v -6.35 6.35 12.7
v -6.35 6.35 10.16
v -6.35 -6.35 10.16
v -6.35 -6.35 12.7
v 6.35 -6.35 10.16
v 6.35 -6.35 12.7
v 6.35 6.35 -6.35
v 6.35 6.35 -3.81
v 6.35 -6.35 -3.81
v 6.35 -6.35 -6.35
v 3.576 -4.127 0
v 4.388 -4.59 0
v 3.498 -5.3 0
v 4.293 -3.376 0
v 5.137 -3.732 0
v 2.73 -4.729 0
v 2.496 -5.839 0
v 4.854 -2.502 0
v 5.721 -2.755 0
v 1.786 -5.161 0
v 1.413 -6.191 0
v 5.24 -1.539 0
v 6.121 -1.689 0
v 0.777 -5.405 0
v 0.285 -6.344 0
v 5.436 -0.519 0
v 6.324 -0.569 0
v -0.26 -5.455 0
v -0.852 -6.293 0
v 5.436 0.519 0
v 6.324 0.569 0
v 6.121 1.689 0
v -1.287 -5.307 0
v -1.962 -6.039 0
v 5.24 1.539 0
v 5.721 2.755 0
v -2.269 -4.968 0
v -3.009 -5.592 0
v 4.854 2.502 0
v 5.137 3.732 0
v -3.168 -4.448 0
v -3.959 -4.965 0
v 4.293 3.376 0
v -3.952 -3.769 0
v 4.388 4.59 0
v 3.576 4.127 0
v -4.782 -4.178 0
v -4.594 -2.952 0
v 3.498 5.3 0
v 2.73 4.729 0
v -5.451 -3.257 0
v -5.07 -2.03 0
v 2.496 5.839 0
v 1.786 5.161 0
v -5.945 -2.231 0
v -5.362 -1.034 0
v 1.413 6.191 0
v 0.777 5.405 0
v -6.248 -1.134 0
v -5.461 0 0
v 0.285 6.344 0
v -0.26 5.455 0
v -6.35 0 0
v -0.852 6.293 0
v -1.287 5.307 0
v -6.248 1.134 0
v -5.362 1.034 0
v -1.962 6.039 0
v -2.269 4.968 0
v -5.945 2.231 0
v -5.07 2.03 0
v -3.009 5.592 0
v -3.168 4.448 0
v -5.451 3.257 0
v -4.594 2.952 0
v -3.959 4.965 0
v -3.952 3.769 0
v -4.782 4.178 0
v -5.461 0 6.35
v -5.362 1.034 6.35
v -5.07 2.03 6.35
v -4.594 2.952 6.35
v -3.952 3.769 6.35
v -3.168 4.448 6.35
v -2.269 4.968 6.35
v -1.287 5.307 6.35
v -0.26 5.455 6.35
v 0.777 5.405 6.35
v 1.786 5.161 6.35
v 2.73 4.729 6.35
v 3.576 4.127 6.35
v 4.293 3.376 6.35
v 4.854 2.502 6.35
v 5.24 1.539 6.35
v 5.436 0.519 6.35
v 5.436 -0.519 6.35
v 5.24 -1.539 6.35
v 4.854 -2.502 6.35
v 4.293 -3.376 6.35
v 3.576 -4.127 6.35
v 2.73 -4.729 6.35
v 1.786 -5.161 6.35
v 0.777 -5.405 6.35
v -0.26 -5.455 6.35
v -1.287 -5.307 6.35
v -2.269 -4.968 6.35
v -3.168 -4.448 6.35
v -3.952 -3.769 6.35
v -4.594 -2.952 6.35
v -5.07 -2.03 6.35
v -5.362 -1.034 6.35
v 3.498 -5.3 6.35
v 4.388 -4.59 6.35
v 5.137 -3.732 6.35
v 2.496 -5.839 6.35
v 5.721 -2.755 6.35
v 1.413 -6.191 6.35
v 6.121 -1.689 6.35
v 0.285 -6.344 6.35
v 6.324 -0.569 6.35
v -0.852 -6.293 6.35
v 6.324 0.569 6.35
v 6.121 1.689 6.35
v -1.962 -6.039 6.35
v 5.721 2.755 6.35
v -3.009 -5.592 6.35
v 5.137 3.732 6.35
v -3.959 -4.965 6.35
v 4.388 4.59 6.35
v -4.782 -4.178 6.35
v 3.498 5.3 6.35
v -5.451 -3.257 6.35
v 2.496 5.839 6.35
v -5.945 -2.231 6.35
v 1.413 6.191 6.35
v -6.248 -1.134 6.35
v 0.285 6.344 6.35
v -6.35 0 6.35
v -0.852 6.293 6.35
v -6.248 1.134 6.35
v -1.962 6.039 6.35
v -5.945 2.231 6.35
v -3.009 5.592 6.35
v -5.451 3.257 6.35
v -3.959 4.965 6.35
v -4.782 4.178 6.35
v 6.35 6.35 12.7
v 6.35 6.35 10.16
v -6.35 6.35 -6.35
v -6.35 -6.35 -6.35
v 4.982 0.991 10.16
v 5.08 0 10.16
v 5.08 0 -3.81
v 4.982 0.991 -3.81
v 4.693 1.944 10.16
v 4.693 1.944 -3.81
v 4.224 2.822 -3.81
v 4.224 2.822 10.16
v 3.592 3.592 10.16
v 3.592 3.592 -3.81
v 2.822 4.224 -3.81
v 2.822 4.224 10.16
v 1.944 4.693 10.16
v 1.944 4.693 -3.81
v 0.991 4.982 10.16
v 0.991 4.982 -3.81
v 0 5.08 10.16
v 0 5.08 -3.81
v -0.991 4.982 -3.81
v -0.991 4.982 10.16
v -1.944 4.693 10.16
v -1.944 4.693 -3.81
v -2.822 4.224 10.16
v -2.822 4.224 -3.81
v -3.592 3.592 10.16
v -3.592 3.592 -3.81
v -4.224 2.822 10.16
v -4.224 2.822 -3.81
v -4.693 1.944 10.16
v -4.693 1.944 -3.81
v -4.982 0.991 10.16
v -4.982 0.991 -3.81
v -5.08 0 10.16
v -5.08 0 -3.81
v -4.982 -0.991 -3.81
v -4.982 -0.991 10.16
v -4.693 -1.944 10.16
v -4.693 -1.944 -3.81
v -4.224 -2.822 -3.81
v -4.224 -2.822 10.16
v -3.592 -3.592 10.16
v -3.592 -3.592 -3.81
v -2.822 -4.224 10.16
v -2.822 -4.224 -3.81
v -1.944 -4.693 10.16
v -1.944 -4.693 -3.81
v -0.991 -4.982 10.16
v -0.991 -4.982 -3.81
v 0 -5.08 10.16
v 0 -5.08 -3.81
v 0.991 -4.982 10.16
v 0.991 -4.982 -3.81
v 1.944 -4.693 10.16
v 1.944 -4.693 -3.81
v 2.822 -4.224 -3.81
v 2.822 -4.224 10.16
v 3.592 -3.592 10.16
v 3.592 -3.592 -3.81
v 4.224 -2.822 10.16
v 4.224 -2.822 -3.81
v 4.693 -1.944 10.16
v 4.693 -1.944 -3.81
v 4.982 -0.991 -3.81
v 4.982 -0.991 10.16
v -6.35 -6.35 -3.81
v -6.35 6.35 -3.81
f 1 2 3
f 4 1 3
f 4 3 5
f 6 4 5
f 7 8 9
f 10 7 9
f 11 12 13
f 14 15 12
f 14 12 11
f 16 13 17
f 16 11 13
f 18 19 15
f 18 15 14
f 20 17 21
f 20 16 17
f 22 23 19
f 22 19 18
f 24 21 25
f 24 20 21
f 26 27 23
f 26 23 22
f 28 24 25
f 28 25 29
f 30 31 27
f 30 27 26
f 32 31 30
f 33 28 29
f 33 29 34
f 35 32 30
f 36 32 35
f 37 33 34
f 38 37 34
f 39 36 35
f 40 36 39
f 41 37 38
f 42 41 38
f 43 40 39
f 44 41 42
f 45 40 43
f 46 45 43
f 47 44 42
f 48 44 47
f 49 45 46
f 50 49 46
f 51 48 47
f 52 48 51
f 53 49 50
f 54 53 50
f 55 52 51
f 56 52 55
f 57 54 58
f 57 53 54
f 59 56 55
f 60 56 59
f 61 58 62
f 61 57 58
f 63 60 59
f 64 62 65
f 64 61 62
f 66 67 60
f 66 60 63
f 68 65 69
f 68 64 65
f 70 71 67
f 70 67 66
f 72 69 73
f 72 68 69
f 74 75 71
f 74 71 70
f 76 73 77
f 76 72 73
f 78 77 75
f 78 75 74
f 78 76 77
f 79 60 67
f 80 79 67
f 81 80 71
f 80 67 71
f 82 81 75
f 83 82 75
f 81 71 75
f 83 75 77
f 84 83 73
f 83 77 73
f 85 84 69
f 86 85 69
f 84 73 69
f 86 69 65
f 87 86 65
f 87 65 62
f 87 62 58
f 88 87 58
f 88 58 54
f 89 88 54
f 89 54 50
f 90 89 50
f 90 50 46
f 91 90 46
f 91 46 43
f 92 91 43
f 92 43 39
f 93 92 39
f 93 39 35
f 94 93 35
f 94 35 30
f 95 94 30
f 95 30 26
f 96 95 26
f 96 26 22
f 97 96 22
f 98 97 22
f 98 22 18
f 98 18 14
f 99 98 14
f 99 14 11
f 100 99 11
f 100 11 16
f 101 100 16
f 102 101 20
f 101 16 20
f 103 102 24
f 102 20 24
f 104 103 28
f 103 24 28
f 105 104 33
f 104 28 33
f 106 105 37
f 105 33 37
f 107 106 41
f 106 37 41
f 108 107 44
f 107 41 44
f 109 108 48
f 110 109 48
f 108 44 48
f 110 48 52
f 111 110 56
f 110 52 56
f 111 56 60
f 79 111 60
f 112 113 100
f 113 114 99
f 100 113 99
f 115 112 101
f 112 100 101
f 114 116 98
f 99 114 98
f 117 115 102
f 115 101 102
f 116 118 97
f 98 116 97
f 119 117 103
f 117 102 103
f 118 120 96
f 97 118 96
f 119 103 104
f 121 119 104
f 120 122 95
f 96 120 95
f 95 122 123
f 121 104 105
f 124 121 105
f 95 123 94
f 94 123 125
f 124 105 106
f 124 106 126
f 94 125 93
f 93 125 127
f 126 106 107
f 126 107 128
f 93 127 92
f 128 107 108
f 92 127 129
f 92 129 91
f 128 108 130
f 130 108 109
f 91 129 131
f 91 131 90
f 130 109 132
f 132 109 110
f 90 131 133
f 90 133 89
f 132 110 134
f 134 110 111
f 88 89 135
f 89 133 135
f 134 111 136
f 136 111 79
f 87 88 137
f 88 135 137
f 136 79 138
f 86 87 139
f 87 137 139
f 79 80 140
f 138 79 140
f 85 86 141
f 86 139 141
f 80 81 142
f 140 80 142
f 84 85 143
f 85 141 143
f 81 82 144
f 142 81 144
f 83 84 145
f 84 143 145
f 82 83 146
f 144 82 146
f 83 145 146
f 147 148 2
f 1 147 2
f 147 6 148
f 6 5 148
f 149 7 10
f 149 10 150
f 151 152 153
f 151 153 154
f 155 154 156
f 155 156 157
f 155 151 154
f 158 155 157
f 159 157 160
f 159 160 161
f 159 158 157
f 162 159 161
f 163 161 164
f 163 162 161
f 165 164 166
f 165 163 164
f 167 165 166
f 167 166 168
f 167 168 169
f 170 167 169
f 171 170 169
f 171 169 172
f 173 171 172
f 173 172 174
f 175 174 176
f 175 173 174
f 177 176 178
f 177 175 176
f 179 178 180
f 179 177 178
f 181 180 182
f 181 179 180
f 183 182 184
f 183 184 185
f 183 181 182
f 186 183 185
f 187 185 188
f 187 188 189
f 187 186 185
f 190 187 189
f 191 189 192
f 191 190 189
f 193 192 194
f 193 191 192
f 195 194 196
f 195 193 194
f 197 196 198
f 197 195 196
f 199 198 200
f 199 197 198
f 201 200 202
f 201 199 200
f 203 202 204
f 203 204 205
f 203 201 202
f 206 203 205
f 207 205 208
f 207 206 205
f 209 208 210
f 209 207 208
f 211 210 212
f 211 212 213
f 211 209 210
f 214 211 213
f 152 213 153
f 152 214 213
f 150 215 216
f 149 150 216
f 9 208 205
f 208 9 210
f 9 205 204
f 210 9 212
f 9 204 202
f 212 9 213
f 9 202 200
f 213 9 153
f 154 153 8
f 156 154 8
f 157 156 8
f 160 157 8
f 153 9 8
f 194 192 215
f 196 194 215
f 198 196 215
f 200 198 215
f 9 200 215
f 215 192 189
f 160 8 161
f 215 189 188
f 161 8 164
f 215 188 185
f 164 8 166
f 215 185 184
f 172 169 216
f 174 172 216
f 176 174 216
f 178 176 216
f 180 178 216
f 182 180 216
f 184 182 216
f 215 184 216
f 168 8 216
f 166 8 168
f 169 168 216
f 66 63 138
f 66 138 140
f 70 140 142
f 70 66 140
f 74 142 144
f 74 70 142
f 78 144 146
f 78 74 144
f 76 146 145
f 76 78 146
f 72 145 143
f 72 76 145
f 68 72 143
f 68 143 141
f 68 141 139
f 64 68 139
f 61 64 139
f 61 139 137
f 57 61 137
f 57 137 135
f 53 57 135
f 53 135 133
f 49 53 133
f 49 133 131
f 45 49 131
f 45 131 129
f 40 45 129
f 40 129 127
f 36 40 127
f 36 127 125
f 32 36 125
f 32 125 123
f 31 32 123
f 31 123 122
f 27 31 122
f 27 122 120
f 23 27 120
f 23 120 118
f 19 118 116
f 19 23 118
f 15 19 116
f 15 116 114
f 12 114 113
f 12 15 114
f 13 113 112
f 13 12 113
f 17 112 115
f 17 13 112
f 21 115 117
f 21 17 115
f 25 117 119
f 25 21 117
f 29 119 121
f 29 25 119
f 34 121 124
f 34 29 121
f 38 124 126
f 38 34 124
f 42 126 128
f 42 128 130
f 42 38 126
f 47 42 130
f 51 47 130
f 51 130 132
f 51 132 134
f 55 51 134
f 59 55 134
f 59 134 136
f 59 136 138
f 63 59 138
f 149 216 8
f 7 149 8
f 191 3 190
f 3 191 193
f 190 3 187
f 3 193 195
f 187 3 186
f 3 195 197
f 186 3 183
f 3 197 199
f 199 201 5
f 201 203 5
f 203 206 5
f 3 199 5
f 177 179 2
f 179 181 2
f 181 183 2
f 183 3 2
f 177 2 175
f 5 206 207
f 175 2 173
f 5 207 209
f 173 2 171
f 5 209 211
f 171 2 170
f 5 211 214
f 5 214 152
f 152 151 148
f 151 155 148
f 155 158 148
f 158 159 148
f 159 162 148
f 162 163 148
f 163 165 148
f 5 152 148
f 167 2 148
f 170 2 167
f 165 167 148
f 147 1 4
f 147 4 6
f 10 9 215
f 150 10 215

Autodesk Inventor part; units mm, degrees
ref_plane "YZ Plane" through (0, 0, 0) normal (1, 0, 0) x (0, 1, 0)
sketch "Sketch1" plane through (0, 0, 0) normal (0, 0, 1) x (1, 0, 0)
  circle A0 centre (0, 0) radius 5.08
  dimension "d0" = 10.16
extrude "Extrusion1" add sketch "Sketch1" along normal blind 10.16
ref_plane "Work Plane1" through (0, 0, 5.08) normal (0, 0, -1) x (-1, 0, 0)
sketch "Sketch4" plane through (0, 0, 0) normal (0, 0, -1) x (-1, 0, 0)
  circle A0 centre (0, 0) radius 5.461
  circle A1 centre (0, 0) radius 6.35
  dimension "d13" = 10.922
  dimension "d14" = 12.7
extrude "Extrusion4" add sketch "Sketch4" against normal blind 6.35
extrude "Extrusion5" add sketch "Sketch1" against normal blind 3.81
sketch "Sketch5" plane through (0, 0, -3.81) normal (0, 0, -1) x (-1, 0, 0)
  line L0 (-6.35, -6.35) -> (6.35, -6.35)
  line L1 (6.35, -6.35) -> (6.35, 6.35)
  line L2 (6.35, 6.35) -> (-6.35, 6.35)
  line L3 (-6.35, 6.35) -> (-6.35, -6.35)
  point P0 (0, 0)
  dimension "d19" = 12.7
  dimension "d20" = 12.7
  dimension "d21" = 6.35
  dimension "d22" = 6.35
extrude "Extrusion6" add sketch "Sketch5" along normal blind 2.54
ref_plane "Work Plane2" through (0, 0, 3.175) normal (0, 0, 1) x (1, 0, 0)
mirror "Mirror1" about plane through (0, 0, 3.175) normal (0, 0, 1) of "Extrusion6"
properties part number "Ring Tolerance Test 5"
